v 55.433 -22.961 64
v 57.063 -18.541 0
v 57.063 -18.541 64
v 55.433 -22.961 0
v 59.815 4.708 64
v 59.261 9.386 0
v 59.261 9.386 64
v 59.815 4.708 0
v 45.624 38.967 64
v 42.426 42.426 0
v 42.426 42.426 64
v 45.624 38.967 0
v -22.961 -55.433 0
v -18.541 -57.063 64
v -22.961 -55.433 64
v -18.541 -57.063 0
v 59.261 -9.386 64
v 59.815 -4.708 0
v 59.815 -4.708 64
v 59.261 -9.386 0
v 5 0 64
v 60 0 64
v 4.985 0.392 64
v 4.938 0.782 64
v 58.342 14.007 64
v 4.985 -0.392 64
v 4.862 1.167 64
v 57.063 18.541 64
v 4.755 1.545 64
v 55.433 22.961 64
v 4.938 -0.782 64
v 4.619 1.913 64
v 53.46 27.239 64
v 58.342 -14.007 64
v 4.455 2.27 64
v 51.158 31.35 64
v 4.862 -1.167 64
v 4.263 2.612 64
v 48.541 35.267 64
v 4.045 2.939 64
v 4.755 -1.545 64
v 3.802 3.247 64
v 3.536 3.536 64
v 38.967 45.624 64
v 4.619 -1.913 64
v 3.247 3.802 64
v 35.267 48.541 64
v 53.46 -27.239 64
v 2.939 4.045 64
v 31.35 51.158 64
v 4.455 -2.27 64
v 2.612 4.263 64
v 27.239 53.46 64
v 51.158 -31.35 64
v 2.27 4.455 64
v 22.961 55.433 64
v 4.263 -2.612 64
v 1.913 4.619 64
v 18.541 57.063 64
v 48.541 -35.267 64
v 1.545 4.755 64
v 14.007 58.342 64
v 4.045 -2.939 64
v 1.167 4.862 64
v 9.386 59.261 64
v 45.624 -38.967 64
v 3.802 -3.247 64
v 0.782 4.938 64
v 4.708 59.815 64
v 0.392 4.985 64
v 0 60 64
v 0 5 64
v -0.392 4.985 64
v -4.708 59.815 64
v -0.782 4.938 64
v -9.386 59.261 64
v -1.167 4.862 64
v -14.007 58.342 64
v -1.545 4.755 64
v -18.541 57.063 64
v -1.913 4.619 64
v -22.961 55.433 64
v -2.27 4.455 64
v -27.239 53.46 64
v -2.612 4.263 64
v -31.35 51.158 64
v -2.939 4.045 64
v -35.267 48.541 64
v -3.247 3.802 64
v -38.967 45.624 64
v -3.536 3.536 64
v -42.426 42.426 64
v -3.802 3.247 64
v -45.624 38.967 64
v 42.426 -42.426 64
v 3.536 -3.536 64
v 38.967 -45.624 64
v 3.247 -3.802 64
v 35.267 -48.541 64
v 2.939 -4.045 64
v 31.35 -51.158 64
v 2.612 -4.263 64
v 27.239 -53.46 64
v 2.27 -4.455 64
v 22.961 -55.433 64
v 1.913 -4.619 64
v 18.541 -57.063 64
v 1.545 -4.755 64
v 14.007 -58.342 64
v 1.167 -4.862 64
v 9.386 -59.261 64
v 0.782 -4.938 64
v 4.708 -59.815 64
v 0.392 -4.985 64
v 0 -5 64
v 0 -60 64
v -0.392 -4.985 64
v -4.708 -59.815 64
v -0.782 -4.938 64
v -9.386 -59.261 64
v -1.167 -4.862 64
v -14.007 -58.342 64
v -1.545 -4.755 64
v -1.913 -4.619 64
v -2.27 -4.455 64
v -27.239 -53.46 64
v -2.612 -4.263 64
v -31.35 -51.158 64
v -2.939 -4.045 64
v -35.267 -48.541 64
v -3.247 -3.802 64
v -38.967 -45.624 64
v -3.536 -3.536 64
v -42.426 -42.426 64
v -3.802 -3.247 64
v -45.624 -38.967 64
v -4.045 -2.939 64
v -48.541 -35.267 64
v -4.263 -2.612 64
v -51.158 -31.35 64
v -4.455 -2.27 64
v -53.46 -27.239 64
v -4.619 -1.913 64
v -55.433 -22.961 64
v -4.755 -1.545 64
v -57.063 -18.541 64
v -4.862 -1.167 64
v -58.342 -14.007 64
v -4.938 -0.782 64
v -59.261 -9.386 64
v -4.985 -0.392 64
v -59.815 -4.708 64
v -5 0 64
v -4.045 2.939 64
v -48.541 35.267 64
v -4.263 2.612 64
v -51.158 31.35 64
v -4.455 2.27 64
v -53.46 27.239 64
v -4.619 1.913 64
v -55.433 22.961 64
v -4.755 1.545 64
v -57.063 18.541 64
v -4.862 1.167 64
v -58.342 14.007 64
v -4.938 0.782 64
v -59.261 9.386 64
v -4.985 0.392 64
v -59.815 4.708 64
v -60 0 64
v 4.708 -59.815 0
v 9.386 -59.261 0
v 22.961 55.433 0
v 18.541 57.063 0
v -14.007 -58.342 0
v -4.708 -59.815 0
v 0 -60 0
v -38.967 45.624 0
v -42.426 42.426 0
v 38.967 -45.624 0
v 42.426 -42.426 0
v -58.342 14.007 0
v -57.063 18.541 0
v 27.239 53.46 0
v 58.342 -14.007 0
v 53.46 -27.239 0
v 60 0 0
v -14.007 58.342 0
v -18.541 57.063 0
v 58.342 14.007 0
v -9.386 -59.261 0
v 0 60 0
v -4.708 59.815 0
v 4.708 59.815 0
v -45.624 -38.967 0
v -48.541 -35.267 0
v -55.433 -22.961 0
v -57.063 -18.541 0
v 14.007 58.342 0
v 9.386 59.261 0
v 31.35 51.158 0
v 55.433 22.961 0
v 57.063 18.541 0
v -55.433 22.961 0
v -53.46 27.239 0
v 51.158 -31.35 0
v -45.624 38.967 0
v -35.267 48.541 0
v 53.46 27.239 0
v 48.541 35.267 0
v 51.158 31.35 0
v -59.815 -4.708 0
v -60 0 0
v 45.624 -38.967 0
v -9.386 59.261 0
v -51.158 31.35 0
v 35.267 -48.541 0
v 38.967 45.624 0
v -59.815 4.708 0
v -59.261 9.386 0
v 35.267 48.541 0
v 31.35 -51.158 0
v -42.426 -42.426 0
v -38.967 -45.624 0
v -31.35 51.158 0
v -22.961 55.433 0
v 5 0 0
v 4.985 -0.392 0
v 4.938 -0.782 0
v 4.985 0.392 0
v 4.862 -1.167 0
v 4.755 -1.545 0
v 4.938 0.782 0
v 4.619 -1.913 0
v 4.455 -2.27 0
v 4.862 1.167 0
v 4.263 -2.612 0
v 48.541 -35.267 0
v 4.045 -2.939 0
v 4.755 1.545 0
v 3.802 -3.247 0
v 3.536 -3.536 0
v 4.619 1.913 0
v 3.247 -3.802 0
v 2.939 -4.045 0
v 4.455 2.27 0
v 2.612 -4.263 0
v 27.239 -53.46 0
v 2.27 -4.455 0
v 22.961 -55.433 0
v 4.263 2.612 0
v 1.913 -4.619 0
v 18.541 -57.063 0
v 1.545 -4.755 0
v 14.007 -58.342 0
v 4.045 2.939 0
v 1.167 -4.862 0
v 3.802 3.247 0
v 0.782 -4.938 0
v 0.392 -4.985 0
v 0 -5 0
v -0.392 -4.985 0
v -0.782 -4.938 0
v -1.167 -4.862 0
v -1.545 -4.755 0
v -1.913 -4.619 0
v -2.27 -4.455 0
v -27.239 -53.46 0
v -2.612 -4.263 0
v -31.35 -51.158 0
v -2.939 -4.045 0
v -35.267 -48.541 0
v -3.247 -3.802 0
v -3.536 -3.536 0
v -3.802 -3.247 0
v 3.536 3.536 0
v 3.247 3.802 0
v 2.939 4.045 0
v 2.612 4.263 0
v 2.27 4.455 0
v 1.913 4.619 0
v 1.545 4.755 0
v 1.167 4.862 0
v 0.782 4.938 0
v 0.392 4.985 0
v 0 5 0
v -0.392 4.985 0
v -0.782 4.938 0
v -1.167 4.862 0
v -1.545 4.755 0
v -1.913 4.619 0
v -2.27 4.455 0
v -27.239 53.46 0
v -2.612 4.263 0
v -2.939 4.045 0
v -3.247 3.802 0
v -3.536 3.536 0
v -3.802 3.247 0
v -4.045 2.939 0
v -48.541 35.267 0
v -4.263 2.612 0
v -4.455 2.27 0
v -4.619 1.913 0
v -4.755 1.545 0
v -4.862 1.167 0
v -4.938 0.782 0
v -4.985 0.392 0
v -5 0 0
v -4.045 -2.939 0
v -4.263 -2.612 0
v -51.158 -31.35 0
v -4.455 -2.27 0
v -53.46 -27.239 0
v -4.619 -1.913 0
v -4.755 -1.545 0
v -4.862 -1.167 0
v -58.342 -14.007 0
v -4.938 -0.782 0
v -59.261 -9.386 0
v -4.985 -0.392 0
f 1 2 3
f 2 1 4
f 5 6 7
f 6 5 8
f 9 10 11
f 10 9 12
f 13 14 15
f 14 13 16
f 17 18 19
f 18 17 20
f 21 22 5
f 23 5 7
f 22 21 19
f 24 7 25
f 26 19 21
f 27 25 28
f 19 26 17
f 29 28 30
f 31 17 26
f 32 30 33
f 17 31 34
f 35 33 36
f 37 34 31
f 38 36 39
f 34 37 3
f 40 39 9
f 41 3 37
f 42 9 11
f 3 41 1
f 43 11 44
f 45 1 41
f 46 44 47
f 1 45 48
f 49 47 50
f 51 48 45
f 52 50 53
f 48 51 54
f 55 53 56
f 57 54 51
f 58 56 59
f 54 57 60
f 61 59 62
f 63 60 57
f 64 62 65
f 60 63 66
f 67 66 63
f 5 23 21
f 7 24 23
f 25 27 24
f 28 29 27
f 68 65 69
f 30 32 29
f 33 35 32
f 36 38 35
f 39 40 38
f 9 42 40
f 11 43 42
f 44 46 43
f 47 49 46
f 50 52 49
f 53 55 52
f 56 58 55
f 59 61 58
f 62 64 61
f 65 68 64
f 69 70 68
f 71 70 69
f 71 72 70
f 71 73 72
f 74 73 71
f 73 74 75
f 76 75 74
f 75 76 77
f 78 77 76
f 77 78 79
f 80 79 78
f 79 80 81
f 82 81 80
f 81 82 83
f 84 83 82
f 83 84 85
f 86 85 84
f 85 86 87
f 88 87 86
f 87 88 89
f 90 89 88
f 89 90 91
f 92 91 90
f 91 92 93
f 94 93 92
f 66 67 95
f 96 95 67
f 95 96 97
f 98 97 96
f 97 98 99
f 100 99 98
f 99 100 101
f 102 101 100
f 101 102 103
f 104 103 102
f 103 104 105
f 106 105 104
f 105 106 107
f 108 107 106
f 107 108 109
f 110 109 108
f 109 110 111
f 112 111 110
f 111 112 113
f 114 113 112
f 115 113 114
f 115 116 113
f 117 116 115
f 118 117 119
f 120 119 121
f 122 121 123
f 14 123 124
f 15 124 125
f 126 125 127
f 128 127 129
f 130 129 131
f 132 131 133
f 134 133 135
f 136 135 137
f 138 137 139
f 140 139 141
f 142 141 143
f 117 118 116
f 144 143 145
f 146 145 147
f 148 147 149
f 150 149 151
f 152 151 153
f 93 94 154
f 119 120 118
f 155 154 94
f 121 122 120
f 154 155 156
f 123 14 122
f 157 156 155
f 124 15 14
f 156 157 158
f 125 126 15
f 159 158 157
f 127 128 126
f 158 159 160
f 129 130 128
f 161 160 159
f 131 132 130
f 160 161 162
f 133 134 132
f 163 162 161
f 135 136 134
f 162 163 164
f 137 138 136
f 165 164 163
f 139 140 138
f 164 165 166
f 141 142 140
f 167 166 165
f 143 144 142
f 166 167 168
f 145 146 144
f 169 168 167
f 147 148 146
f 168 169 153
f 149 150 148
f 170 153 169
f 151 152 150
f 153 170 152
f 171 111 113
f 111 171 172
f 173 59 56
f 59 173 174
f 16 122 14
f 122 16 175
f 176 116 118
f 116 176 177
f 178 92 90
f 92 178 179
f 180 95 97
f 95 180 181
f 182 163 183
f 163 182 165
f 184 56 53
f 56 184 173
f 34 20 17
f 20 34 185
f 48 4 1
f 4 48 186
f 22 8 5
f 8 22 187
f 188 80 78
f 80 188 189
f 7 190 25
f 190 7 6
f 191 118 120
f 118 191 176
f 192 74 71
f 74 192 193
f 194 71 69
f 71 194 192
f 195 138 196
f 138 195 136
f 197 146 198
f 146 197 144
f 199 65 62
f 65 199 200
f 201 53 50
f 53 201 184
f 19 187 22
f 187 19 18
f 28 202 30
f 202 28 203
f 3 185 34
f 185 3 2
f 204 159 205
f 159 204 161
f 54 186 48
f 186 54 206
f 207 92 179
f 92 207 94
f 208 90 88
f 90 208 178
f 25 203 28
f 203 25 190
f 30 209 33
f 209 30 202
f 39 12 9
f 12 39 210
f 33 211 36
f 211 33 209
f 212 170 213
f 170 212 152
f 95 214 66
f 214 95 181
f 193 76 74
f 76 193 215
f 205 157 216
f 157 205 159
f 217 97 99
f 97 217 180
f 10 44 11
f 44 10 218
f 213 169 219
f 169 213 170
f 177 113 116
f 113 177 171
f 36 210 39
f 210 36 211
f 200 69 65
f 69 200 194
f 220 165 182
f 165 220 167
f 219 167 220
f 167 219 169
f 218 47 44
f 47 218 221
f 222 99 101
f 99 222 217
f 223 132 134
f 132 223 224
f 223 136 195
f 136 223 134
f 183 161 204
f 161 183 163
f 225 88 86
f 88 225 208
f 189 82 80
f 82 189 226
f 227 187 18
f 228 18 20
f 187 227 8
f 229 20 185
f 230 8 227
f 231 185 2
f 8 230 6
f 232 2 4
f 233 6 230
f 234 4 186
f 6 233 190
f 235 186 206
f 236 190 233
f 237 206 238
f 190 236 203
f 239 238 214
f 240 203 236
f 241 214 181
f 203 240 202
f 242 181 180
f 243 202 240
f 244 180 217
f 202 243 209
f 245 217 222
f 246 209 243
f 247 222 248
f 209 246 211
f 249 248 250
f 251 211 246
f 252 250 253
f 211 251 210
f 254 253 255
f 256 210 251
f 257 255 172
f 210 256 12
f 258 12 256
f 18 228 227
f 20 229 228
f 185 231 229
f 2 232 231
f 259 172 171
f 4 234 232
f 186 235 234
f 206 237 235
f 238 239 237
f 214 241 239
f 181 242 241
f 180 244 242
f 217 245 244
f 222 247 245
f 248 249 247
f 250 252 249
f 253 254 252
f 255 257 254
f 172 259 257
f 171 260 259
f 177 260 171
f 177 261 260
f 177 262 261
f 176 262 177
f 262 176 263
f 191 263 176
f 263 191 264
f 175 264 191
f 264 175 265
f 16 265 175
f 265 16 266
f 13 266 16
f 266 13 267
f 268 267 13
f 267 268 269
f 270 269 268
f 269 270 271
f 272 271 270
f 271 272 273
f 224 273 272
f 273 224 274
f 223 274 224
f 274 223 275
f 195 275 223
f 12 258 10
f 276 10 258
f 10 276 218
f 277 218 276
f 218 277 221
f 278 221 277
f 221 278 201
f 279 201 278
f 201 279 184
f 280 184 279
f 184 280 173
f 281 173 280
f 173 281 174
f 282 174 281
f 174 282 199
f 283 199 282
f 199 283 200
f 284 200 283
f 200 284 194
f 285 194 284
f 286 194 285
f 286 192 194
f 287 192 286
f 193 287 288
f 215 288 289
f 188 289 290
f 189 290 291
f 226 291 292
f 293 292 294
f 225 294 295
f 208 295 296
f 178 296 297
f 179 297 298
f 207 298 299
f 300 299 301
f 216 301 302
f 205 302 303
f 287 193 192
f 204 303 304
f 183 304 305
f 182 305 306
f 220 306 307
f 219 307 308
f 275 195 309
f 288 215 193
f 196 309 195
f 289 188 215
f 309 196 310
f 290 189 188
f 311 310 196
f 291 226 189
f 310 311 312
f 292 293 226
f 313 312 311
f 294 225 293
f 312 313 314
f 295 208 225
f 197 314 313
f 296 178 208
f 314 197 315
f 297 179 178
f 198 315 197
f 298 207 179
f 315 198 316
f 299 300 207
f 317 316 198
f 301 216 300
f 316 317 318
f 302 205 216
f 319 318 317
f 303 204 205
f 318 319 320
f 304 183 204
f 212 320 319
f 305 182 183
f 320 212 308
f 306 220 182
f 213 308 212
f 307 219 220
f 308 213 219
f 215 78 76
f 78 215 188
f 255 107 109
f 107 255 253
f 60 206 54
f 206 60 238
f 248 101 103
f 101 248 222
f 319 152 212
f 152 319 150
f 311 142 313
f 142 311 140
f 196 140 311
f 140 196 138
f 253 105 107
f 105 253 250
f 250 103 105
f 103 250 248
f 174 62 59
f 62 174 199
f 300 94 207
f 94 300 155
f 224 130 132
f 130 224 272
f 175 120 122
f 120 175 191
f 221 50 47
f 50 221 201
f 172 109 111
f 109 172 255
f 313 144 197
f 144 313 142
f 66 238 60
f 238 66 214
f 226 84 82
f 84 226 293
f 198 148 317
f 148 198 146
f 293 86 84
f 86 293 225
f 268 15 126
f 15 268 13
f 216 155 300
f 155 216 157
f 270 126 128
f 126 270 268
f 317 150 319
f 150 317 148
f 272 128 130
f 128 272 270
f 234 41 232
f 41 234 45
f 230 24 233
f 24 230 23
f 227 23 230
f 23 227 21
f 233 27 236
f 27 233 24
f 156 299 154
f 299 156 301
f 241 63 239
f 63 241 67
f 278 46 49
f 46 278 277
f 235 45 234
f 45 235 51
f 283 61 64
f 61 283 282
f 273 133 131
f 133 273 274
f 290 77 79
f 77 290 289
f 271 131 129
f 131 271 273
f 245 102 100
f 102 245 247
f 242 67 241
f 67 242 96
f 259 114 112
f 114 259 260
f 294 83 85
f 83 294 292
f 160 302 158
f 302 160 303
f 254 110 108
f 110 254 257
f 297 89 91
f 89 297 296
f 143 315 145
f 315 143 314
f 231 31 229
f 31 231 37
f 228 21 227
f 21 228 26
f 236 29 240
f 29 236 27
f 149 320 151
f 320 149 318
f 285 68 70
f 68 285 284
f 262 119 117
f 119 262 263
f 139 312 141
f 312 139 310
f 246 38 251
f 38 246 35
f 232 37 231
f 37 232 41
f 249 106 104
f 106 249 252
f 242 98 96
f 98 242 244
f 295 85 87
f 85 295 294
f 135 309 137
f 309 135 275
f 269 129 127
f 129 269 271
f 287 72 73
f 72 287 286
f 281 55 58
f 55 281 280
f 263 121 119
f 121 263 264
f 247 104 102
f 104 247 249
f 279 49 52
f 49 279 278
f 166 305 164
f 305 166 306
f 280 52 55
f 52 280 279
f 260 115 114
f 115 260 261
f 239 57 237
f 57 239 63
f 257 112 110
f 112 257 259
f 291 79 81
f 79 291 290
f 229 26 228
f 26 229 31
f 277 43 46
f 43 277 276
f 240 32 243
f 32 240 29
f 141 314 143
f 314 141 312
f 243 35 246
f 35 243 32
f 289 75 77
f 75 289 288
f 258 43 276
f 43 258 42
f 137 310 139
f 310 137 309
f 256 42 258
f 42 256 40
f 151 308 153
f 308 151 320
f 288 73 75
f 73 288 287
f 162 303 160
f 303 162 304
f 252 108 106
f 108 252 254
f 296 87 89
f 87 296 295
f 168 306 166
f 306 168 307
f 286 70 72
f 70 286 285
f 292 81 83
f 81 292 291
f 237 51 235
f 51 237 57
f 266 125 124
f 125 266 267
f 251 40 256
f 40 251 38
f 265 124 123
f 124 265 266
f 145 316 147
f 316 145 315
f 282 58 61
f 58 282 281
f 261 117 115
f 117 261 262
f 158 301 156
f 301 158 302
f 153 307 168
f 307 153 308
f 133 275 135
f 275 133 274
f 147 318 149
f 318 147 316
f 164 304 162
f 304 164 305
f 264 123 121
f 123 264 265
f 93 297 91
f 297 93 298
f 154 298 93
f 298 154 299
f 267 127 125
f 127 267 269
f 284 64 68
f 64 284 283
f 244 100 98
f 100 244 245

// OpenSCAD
// Spacer - fits between gear mount and platform

$fn = 80;

rodRadius = 5;
motorHeight = 64;
spacerRadius = 60;

difference() {
    cylinder(r = spacerRadius, h = motorHeight);
    translate([0, 0, -0.5])
    cylinder(r = rodRadius, h = motorHeight + 1);
}
